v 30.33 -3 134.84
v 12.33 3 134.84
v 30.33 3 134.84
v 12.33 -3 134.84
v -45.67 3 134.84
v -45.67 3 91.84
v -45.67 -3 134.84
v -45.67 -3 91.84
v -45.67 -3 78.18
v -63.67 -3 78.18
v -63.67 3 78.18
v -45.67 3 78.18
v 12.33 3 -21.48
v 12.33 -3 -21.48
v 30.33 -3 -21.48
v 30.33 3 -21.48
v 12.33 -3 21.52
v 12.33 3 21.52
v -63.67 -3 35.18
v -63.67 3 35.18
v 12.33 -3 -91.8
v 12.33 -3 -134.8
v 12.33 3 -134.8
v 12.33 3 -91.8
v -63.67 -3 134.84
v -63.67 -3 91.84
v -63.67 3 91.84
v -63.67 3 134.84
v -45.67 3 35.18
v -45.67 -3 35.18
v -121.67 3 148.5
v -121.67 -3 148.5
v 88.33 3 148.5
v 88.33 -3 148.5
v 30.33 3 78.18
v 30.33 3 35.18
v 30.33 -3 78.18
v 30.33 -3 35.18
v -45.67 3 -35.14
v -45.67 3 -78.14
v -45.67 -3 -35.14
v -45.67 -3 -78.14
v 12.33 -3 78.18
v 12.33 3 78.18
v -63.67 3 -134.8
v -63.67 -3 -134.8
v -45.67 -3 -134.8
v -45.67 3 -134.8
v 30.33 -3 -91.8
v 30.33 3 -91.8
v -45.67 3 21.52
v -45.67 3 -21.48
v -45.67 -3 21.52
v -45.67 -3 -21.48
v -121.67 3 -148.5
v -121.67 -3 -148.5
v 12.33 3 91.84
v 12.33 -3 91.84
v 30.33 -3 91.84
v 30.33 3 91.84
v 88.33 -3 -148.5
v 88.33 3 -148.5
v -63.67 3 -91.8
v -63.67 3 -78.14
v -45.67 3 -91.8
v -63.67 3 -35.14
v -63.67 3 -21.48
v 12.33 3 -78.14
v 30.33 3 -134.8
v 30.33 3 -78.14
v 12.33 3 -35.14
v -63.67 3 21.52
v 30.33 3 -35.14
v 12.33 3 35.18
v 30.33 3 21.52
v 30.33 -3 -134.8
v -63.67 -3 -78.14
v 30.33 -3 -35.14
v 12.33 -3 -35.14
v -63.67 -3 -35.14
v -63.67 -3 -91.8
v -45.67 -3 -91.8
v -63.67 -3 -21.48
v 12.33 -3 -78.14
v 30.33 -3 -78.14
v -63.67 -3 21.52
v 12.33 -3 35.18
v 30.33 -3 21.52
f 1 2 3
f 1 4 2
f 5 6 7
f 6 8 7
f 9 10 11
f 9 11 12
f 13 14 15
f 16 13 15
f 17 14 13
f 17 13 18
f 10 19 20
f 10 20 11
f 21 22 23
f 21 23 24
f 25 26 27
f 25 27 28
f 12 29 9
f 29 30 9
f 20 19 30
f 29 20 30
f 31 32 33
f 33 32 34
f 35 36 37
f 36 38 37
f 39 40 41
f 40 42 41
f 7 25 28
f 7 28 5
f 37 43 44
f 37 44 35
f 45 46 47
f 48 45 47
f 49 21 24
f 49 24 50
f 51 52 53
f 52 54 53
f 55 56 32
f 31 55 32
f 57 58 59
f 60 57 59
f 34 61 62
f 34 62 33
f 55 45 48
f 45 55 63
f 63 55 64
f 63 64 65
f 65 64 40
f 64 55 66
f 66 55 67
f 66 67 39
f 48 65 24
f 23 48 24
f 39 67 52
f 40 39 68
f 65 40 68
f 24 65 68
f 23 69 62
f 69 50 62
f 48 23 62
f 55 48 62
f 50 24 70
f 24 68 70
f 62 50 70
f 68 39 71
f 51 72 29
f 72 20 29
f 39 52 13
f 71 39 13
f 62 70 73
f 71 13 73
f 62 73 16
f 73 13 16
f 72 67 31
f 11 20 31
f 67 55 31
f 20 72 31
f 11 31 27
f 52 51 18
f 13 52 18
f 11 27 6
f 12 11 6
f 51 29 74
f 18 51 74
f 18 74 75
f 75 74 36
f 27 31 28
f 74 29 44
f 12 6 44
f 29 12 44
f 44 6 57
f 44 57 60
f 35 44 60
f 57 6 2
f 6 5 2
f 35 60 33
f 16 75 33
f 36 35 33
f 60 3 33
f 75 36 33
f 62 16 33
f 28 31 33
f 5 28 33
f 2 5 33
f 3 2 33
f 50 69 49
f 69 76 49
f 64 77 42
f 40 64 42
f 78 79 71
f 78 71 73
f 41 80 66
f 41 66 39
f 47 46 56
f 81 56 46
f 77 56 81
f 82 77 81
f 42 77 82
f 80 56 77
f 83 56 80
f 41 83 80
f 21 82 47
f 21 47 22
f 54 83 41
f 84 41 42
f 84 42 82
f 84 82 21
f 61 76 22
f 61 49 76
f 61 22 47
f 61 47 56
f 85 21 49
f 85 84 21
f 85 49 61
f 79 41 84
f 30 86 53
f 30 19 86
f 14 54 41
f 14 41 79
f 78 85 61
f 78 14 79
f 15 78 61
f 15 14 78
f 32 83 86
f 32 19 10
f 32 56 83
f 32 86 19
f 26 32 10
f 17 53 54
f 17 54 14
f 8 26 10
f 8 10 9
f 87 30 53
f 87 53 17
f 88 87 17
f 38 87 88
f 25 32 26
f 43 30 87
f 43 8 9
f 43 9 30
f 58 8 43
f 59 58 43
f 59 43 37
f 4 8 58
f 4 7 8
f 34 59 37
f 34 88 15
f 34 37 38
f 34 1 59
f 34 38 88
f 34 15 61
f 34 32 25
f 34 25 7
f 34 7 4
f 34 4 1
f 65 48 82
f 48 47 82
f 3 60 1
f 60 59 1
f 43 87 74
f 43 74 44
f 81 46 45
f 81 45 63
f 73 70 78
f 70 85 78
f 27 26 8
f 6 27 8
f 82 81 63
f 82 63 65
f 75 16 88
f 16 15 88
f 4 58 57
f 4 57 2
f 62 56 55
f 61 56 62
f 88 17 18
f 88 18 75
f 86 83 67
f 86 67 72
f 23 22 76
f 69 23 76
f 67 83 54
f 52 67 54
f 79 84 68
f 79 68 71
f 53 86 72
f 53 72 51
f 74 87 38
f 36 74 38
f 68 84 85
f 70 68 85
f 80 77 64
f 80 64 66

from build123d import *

# Parameters (mm, degrees)
F0_W     = 210
F0_H     = 297
F0_W_2   = 18
F0_H_2   = 43
F1_DEPTH = 3


with BuildPart() as f1:
    # F0 (on Front) → F1 (new body, symmetric)
    with BuildSketch(Plane.XZ):
        with Locations((-16.67, 0)):
            Rectangle(F0_W, F0_H)
        with Locations((-54.67, -113.3)):
            Rectangle(F0_W_2, F0_H_2, mode=Mode.SUBTRACT)
        with Locations((-54.67, -56.64)):
            Rectangle(F0_W_2, F0_H_2, mode=Mode.SUBTRACT)
        with Locations((21.33, -113.3)):
            Rectangle(F0_W_2, F0_H_2, mode=Mode.SUBTRACT)
        with Locations((21.33, -56.64)):
            Rectangle(F0_W_2, F0_H_2, mode=Mode.SUBTRACT)
        with Locations((-54.67, 0.02)):
            Rectangle(F0_W_2, F0_H_2, mode=Mode.SUBTRACT)
        with Locations((-54.67, 56.68)):
            Rectangle(F0_W_2, F0_H_2, mode=Mode.SUBTRACT)
        with Locations((-54.67, 113.34)):
            Rectangle(F0_W_2, F0_H_2, mode=Mode.SUBTRACT)
        with Locations((21.33, 0.02)):
            Rectangle(F0_W_2, F0_H_2, mode=Mode.SUBTRACT)
        with Locations((21.33, 56.68)):
            Rectangle(F0_W_2, F0_H_2, mode=Mode.SUBTRACT)
        with Locations((21.33, 113.34)):
            Rectangle(F0_W_2, F0_H_2, mode=Mode.SUBTRACT)
    extrude(amount=F1_DEPTH, both=True)


solid = f1.part
